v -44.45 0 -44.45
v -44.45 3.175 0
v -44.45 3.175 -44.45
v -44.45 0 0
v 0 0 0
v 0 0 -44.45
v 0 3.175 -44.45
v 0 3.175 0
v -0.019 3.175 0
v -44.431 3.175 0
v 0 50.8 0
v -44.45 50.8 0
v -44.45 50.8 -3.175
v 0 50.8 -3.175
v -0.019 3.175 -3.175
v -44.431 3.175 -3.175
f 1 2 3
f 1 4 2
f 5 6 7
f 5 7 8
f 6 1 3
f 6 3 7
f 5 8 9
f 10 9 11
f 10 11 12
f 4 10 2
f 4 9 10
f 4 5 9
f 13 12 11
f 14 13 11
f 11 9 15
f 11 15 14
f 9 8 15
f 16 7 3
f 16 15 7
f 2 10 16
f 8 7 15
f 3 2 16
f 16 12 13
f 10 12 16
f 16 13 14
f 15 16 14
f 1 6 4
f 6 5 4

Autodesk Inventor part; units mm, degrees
ref_plane "YZ Plane" through (0, 0, 0) normal (1, 0, 0) x (0, 1, 0)
ref_plane "XZ Plane" through (0, 0, 0) normal (0, 1, 0) x (-1, 0, 0)
ref_plane "XY Plane" through (0, 0, 0) normal (0, 0, 1) x (1, 0, 0)
sketch "Sketch1" plane through (0, 0, 0) normal (0, 1, 0) x (-1, 0, 0)
  line L0 (0, 0) -> (44.45, 0)
  line L1 (44.45, 0) -> (44.45, -44.45)
  line L2 (44.45, -44.45) -> (0, -44.45)
  line L3 (0, -44.45) -> (0, 0)
  dimension "d0" = 44.45
  dimension "d1" = 44.45
extrude "Extrusion1" add sketch "Sketch1" along normal blind 3.175
sketch "Sketch2" plane through (-44.45, 0, 0) normal (0, 0, 1) x (1, 0, 0)
  line L0 (0, 50.8) -> (44.45, 50.8)
  line L1 (44.45, 0) -> (0, 0) projected
  line L2 (22.225, 50.8) -> (22.225, 54.352)
  line L3 (22.225, 0) -> (22.225, -5.76)
  line L4 (0, 50.8) -> (0.0188, 3.175)
  line L5 (0.0188, 3.175) -> (44.4312, 3.175)
  line L6 (44.4312, 3.175) -> (44.45, 50.8)
  line L7 (0, 3.175) -> (44.45, 3.175) projected
  dimension "d4" = 44.45
  dimension "d5" = 50.8
  dimension "d6" = 0
  dimension "d9" = 0
extrude "Extrusion2" add sketch "Sketch2" against normal blind 3.175
properties part number "Bottom Elevator Bracket Square"
